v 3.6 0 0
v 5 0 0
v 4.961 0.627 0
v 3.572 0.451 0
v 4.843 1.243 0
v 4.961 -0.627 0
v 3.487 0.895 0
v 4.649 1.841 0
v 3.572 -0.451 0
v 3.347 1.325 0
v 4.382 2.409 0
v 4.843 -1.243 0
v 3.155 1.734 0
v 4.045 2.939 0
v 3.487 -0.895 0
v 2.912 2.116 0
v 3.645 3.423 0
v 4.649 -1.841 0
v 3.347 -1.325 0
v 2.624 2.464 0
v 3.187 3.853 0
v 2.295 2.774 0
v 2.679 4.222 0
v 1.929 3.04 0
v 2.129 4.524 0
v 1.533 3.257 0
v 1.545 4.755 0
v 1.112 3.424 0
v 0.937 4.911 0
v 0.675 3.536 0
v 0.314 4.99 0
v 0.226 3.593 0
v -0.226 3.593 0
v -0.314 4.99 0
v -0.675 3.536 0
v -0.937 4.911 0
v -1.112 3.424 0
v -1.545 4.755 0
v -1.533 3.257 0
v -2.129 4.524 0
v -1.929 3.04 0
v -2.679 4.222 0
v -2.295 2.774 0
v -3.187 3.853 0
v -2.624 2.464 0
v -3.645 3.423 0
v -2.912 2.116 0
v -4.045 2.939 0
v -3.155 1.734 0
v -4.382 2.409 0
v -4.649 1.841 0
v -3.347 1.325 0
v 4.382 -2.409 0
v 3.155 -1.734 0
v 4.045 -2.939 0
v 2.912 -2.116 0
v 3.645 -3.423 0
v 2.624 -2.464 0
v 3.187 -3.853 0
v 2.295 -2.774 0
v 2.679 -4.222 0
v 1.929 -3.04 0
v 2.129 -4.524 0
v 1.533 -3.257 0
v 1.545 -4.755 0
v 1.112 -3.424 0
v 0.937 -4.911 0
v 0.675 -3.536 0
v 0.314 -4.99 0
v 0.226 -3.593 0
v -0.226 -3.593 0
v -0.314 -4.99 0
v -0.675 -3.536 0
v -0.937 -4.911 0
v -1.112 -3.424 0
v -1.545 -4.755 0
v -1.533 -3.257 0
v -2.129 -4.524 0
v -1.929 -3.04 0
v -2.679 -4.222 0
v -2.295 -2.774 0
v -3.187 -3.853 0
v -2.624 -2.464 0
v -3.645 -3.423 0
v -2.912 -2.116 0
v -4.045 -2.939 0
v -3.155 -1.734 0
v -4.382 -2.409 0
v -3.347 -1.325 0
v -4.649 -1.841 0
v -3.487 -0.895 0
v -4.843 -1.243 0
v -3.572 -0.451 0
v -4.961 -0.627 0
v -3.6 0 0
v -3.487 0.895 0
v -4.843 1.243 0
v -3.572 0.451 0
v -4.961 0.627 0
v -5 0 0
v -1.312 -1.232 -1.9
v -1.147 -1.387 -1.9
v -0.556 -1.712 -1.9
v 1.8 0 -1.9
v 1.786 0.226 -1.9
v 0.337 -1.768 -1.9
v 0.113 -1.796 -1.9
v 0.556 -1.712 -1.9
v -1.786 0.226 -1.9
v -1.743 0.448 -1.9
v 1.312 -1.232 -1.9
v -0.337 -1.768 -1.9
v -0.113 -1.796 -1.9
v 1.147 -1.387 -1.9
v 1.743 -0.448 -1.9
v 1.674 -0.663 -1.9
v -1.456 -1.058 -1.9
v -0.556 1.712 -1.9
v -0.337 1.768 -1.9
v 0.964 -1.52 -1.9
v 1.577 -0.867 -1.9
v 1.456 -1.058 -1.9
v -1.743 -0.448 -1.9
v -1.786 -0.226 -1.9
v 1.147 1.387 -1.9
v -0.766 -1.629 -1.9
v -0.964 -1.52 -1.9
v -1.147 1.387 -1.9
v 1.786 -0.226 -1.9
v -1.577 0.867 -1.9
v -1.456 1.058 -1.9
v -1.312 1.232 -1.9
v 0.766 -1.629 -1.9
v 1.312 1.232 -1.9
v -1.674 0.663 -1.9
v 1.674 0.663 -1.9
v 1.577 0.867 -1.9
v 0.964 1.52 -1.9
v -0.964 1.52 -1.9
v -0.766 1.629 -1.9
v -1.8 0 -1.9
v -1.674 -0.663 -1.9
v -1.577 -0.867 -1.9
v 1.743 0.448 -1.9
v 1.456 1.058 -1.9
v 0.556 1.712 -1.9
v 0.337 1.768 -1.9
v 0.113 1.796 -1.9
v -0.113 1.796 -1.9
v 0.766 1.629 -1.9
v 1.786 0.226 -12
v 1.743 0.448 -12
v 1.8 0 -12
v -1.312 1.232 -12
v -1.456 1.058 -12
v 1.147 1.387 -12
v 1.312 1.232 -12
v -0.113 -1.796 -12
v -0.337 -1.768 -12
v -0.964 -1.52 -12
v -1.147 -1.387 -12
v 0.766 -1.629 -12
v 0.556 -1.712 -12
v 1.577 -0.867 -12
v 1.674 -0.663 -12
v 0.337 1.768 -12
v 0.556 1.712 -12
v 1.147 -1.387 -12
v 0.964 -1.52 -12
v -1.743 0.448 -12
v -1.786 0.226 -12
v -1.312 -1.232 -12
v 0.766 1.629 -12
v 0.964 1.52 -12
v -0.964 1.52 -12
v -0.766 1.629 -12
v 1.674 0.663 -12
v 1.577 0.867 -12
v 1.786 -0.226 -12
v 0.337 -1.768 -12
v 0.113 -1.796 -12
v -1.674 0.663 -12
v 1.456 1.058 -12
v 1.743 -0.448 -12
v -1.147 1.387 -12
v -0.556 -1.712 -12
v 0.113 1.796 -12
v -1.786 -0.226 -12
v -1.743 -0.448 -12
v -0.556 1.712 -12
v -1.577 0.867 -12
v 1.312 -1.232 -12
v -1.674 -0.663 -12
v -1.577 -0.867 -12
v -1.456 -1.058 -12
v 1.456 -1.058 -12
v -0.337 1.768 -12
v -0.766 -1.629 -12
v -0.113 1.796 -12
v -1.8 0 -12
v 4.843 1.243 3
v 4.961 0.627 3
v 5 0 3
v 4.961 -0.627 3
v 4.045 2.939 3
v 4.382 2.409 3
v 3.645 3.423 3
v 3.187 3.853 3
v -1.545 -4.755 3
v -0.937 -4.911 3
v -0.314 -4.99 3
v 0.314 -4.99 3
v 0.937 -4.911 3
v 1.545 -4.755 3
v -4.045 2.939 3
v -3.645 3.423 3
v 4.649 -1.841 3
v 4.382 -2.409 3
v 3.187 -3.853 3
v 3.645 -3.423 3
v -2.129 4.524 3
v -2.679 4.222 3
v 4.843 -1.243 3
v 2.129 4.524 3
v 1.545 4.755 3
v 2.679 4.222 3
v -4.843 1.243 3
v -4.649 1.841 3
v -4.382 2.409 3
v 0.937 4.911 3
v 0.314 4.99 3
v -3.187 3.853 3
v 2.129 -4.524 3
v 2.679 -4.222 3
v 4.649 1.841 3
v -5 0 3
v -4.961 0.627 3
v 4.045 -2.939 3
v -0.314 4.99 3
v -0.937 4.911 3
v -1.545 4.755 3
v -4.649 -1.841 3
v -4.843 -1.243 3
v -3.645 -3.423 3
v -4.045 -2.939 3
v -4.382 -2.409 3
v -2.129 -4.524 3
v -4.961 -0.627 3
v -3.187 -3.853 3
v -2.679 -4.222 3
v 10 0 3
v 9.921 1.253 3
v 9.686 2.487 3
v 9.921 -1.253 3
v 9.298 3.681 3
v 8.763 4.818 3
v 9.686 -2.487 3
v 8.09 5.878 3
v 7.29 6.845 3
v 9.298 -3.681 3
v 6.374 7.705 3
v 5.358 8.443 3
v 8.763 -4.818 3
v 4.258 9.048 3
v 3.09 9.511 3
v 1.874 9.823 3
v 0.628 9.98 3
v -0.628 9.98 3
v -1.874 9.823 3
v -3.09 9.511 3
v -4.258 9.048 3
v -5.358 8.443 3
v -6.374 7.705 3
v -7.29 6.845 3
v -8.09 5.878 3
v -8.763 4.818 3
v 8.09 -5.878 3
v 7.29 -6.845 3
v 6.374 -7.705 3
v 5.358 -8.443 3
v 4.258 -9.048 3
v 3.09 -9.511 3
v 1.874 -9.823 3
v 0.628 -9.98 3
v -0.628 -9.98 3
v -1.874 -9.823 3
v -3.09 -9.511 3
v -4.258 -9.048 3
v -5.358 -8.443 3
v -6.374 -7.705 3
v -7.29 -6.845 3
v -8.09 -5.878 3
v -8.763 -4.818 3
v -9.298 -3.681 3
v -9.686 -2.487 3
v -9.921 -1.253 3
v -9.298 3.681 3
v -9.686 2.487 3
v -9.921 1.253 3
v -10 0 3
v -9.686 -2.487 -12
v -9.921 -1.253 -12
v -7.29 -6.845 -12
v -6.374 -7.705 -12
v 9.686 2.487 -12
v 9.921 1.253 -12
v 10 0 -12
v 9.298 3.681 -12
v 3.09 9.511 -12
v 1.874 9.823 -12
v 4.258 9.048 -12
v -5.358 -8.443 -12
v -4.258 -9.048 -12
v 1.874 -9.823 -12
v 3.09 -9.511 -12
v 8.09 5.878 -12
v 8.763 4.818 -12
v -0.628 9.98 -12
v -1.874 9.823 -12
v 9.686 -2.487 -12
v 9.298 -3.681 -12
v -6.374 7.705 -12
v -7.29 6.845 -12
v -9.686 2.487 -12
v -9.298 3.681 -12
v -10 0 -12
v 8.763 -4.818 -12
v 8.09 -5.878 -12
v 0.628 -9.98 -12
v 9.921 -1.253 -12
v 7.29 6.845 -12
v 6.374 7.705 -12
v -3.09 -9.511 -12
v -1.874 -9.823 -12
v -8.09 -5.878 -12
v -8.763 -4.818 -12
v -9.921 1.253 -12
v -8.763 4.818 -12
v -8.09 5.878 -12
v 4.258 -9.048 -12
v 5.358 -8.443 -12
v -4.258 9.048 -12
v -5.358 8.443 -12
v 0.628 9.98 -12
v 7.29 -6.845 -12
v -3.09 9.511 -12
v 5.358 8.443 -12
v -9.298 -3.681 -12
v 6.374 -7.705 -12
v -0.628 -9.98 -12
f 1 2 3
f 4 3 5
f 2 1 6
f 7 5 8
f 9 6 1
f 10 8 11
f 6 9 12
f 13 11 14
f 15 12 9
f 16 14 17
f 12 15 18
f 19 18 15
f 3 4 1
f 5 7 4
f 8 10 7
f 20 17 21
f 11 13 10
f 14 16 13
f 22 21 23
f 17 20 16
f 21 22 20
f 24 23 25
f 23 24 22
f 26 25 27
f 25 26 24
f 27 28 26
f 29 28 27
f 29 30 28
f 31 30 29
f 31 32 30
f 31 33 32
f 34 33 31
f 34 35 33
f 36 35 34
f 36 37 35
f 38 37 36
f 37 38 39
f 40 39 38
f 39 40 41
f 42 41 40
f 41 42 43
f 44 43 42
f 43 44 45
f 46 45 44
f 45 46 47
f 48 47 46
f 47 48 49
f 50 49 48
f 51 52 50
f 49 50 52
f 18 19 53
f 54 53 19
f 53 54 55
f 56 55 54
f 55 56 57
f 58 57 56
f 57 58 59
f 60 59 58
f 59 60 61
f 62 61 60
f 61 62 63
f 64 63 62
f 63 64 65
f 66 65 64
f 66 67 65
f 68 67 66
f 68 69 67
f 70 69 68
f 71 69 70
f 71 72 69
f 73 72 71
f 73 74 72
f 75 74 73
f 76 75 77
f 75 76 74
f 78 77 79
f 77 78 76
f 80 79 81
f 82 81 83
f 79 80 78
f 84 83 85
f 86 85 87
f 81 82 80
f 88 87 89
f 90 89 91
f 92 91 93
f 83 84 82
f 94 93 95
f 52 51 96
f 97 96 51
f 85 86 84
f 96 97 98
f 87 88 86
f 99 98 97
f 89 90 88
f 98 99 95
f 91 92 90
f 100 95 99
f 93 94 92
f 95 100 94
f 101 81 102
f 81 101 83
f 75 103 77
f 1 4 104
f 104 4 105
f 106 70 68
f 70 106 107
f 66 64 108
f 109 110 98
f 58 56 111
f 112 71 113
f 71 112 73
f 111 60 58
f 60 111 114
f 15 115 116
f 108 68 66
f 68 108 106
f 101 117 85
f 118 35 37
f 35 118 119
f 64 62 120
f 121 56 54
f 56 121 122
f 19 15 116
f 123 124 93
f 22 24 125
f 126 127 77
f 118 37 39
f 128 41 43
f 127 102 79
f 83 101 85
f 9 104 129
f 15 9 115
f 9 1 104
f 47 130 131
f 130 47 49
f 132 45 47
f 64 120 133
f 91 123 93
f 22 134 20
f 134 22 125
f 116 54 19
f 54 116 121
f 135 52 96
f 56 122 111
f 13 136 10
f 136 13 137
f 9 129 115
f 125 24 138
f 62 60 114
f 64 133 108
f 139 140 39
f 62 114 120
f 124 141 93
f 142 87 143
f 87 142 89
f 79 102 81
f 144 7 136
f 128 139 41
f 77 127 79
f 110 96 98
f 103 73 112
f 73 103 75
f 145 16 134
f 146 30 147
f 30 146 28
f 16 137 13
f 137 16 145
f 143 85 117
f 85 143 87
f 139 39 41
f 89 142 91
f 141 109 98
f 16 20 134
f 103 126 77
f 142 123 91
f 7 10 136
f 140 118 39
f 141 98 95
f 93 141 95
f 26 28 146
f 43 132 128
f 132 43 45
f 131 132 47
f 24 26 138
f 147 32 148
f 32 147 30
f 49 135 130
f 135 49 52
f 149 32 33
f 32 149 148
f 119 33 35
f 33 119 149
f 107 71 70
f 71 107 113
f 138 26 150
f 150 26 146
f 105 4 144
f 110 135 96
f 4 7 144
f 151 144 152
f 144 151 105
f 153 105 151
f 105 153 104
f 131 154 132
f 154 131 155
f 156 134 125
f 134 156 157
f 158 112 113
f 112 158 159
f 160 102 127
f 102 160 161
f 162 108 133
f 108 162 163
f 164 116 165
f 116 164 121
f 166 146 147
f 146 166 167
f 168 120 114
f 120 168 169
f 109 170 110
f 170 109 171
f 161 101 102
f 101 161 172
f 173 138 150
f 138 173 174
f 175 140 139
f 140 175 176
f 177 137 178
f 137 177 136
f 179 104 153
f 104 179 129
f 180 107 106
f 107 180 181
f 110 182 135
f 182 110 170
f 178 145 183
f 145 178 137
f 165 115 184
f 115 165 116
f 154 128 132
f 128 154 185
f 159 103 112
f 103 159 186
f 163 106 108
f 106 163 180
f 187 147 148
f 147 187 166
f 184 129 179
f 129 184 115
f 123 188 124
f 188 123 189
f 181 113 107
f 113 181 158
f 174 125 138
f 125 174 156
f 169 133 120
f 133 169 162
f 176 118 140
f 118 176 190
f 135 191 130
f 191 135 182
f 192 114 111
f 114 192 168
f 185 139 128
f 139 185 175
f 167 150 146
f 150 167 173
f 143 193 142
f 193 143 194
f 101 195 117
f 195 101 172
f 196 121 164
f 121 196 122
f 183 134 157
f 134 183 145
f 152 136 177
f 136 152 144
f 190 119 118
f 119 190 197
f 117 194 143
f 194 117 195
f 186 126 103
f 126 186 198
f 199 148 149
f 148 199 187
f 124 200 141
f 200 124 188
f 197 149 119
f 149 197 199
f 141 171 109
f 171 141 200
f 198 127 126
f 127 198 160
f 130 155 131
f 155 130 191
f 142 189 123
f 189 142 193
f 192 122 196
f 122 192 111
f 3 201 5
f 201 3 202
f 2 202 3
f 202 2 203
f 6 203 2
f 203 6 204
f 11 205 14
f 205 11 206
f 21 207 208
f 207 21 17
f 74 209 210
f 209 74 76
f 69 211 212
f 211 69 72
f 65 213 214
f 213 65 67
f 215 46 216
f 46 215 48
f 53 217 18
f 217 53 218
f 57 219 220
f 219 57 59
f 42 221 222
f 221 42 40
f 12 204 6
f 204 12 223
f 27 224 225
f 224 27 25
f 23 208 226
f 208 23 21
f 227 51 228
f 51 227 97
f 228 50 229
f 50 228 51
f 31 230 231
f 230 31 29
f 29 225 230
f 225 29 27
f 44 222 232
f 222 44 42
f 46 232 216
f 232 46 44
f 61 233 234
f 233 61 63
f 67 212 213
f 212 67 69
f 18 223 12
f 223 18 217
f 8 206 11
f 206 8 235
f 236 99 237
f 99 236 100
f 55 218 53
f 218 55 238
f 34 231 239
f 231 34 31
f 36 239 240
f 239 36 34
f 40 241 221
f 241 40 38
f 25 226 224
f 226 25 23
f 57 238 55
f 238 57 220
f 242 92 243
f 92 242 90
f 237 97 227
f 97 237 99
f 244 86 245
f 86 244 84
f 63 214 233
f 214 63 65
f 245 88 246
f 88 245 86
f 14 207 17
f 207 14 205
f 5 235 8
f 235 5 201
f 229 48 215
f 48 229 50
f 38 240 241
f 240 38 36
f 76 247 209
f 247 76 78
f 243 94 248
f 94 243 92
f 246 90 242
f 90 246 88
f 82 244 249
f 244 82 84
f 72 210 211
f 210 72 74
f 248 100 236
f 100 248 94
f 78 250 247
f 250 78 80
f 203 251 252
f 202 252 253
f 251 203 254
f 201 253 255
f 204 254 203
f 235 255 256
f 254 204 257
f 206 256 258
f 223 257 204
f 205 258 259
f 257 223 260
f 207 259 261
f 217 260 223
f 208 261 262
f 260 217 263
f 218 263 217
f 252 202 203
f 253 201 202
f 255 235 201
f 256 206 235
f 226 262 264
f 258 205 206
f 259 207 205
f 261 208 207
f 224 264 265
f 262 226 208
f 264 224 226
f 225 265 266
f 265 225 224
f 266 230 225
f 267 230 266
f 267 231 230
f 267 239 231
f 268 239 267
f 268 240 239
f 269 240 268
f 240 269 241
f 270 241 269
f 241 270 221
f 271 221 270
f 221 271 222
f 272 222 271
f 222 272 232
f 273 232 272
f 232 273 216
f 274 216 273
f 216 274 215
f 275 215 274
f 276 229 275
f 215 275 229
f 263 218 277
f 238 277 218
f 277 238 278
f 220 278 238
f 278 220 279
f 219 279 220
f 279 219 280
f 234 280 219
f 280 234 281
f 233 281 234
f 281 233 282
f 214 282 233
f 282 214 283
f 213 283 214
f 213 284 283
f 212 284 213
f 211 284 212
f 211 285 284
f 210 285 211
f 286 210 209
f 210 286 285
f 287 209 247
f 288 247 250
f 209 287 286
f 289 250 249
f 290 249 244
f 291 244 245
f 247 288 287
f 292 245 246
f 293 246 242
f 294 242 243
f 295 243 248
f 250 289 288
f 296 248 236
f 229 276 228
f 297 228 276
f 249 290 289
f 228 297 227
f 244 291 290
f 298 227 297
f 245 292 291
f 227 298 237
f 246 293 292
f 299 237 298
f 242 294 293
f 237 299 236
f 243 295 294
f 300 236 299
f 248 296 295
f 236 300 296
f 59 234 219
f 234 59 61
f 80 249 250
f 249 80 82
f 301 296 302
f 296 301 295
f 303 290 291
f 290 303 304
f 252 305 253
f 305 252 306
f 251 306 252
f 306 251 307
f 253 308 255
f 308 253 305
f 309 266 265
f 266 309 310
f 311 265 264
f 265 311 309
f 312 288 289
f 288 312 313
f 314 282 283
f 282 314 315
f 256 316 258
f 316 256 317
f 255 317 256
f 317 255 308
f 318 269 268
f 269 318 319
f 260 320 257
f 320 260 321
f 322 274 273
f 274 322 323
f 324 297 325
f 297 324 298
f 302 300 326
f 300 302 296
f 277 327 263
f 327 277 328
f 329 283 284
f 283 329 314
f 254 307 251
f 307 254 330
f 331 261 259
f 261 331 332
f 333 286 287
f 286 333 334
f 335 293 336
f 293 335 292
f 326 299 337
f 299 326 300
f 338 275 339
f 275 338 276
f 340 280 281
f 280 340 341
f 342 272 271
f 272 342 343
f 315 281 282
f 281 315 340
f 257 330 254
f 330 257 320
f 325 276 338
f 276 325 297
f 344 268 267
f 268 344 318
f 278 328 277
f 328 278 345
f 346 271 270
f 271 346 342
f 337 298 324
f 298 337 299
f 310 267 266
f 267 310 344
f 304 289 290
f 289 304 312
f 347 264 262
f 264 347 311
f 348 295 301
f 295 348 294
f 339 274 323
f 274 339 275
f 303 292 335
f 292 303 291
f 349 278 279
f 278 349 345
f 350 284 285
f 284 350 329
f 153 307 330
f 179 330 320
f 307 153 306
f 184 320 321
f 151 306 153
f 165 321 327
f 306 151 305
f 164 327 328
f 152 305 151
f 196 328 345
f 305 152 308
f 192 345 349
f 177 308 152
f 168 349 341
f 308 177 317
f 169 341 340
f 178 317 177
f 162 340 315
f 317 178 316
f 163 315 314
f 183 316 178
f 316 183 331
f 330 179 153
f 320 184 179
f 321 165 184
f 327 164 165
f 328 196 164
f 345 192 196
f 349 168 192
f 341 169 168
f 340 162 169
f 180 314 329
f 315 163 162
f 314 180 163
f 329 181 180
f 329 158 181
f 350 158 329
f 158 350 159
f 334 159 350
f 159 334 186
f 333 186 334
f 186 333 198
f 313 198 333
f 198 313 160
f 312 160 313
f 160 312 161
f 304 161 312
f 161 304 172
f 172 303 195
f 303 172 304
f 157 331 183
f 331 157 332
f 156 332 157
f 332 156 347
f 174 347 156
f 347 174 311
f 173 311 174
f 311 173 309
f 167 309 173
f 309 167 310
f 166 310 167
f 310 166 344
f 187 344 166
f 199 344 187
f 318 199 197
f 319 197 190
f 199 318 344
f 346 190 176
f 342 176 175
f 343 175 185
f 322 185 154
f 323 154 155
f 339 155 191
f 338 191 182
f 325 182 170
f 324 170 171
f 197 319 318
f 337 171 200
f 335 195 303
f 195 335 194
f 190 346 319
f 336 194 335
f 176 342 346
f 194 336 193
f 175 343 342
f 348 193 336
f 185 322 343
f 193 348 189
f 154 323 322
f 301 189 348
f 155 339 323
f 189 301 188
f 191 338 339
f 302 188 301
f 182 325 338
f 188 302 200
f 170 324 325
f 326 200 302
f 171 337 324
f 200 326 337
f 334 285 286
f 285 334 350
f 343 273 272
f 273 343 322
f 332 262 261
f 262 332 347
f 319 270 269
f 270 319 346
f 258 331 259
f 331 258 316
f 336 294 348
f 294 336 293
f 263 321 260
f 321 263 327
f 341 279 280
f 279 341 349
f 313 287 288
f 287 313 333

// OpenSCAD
$fn = 50;

difference() {
	union() {
		translate(v = [0, 0, -12.0]) {
			cylinder(h = 15, r = 10.0);
		}
	}
	union() {
		translate(v = [0, 0, 0]) {
			rotate(a = [0, 0, 0]) {
				difference() {
					union() {
						translate(v = [0, 0, -15.0]) {
							cylinder(h = 15, r = 1.5);
						}
						translate(v = [0, 0, -1.9]) {
							cylinder(h = 1.9, r1 = 1.8, r2 = 3.6);
						}
						translate(v = [0, 0, -15.0]) {
							cylinder(h = 15, r = 1.8);
						}
						translate(v = [0, 0, -15.0]) {
							cylinder(h = 15, r = 1.5);
						}
					}
					union();
				}
			}
		}
		#cylinder(h = 3, r = 5.0);
	}
}
